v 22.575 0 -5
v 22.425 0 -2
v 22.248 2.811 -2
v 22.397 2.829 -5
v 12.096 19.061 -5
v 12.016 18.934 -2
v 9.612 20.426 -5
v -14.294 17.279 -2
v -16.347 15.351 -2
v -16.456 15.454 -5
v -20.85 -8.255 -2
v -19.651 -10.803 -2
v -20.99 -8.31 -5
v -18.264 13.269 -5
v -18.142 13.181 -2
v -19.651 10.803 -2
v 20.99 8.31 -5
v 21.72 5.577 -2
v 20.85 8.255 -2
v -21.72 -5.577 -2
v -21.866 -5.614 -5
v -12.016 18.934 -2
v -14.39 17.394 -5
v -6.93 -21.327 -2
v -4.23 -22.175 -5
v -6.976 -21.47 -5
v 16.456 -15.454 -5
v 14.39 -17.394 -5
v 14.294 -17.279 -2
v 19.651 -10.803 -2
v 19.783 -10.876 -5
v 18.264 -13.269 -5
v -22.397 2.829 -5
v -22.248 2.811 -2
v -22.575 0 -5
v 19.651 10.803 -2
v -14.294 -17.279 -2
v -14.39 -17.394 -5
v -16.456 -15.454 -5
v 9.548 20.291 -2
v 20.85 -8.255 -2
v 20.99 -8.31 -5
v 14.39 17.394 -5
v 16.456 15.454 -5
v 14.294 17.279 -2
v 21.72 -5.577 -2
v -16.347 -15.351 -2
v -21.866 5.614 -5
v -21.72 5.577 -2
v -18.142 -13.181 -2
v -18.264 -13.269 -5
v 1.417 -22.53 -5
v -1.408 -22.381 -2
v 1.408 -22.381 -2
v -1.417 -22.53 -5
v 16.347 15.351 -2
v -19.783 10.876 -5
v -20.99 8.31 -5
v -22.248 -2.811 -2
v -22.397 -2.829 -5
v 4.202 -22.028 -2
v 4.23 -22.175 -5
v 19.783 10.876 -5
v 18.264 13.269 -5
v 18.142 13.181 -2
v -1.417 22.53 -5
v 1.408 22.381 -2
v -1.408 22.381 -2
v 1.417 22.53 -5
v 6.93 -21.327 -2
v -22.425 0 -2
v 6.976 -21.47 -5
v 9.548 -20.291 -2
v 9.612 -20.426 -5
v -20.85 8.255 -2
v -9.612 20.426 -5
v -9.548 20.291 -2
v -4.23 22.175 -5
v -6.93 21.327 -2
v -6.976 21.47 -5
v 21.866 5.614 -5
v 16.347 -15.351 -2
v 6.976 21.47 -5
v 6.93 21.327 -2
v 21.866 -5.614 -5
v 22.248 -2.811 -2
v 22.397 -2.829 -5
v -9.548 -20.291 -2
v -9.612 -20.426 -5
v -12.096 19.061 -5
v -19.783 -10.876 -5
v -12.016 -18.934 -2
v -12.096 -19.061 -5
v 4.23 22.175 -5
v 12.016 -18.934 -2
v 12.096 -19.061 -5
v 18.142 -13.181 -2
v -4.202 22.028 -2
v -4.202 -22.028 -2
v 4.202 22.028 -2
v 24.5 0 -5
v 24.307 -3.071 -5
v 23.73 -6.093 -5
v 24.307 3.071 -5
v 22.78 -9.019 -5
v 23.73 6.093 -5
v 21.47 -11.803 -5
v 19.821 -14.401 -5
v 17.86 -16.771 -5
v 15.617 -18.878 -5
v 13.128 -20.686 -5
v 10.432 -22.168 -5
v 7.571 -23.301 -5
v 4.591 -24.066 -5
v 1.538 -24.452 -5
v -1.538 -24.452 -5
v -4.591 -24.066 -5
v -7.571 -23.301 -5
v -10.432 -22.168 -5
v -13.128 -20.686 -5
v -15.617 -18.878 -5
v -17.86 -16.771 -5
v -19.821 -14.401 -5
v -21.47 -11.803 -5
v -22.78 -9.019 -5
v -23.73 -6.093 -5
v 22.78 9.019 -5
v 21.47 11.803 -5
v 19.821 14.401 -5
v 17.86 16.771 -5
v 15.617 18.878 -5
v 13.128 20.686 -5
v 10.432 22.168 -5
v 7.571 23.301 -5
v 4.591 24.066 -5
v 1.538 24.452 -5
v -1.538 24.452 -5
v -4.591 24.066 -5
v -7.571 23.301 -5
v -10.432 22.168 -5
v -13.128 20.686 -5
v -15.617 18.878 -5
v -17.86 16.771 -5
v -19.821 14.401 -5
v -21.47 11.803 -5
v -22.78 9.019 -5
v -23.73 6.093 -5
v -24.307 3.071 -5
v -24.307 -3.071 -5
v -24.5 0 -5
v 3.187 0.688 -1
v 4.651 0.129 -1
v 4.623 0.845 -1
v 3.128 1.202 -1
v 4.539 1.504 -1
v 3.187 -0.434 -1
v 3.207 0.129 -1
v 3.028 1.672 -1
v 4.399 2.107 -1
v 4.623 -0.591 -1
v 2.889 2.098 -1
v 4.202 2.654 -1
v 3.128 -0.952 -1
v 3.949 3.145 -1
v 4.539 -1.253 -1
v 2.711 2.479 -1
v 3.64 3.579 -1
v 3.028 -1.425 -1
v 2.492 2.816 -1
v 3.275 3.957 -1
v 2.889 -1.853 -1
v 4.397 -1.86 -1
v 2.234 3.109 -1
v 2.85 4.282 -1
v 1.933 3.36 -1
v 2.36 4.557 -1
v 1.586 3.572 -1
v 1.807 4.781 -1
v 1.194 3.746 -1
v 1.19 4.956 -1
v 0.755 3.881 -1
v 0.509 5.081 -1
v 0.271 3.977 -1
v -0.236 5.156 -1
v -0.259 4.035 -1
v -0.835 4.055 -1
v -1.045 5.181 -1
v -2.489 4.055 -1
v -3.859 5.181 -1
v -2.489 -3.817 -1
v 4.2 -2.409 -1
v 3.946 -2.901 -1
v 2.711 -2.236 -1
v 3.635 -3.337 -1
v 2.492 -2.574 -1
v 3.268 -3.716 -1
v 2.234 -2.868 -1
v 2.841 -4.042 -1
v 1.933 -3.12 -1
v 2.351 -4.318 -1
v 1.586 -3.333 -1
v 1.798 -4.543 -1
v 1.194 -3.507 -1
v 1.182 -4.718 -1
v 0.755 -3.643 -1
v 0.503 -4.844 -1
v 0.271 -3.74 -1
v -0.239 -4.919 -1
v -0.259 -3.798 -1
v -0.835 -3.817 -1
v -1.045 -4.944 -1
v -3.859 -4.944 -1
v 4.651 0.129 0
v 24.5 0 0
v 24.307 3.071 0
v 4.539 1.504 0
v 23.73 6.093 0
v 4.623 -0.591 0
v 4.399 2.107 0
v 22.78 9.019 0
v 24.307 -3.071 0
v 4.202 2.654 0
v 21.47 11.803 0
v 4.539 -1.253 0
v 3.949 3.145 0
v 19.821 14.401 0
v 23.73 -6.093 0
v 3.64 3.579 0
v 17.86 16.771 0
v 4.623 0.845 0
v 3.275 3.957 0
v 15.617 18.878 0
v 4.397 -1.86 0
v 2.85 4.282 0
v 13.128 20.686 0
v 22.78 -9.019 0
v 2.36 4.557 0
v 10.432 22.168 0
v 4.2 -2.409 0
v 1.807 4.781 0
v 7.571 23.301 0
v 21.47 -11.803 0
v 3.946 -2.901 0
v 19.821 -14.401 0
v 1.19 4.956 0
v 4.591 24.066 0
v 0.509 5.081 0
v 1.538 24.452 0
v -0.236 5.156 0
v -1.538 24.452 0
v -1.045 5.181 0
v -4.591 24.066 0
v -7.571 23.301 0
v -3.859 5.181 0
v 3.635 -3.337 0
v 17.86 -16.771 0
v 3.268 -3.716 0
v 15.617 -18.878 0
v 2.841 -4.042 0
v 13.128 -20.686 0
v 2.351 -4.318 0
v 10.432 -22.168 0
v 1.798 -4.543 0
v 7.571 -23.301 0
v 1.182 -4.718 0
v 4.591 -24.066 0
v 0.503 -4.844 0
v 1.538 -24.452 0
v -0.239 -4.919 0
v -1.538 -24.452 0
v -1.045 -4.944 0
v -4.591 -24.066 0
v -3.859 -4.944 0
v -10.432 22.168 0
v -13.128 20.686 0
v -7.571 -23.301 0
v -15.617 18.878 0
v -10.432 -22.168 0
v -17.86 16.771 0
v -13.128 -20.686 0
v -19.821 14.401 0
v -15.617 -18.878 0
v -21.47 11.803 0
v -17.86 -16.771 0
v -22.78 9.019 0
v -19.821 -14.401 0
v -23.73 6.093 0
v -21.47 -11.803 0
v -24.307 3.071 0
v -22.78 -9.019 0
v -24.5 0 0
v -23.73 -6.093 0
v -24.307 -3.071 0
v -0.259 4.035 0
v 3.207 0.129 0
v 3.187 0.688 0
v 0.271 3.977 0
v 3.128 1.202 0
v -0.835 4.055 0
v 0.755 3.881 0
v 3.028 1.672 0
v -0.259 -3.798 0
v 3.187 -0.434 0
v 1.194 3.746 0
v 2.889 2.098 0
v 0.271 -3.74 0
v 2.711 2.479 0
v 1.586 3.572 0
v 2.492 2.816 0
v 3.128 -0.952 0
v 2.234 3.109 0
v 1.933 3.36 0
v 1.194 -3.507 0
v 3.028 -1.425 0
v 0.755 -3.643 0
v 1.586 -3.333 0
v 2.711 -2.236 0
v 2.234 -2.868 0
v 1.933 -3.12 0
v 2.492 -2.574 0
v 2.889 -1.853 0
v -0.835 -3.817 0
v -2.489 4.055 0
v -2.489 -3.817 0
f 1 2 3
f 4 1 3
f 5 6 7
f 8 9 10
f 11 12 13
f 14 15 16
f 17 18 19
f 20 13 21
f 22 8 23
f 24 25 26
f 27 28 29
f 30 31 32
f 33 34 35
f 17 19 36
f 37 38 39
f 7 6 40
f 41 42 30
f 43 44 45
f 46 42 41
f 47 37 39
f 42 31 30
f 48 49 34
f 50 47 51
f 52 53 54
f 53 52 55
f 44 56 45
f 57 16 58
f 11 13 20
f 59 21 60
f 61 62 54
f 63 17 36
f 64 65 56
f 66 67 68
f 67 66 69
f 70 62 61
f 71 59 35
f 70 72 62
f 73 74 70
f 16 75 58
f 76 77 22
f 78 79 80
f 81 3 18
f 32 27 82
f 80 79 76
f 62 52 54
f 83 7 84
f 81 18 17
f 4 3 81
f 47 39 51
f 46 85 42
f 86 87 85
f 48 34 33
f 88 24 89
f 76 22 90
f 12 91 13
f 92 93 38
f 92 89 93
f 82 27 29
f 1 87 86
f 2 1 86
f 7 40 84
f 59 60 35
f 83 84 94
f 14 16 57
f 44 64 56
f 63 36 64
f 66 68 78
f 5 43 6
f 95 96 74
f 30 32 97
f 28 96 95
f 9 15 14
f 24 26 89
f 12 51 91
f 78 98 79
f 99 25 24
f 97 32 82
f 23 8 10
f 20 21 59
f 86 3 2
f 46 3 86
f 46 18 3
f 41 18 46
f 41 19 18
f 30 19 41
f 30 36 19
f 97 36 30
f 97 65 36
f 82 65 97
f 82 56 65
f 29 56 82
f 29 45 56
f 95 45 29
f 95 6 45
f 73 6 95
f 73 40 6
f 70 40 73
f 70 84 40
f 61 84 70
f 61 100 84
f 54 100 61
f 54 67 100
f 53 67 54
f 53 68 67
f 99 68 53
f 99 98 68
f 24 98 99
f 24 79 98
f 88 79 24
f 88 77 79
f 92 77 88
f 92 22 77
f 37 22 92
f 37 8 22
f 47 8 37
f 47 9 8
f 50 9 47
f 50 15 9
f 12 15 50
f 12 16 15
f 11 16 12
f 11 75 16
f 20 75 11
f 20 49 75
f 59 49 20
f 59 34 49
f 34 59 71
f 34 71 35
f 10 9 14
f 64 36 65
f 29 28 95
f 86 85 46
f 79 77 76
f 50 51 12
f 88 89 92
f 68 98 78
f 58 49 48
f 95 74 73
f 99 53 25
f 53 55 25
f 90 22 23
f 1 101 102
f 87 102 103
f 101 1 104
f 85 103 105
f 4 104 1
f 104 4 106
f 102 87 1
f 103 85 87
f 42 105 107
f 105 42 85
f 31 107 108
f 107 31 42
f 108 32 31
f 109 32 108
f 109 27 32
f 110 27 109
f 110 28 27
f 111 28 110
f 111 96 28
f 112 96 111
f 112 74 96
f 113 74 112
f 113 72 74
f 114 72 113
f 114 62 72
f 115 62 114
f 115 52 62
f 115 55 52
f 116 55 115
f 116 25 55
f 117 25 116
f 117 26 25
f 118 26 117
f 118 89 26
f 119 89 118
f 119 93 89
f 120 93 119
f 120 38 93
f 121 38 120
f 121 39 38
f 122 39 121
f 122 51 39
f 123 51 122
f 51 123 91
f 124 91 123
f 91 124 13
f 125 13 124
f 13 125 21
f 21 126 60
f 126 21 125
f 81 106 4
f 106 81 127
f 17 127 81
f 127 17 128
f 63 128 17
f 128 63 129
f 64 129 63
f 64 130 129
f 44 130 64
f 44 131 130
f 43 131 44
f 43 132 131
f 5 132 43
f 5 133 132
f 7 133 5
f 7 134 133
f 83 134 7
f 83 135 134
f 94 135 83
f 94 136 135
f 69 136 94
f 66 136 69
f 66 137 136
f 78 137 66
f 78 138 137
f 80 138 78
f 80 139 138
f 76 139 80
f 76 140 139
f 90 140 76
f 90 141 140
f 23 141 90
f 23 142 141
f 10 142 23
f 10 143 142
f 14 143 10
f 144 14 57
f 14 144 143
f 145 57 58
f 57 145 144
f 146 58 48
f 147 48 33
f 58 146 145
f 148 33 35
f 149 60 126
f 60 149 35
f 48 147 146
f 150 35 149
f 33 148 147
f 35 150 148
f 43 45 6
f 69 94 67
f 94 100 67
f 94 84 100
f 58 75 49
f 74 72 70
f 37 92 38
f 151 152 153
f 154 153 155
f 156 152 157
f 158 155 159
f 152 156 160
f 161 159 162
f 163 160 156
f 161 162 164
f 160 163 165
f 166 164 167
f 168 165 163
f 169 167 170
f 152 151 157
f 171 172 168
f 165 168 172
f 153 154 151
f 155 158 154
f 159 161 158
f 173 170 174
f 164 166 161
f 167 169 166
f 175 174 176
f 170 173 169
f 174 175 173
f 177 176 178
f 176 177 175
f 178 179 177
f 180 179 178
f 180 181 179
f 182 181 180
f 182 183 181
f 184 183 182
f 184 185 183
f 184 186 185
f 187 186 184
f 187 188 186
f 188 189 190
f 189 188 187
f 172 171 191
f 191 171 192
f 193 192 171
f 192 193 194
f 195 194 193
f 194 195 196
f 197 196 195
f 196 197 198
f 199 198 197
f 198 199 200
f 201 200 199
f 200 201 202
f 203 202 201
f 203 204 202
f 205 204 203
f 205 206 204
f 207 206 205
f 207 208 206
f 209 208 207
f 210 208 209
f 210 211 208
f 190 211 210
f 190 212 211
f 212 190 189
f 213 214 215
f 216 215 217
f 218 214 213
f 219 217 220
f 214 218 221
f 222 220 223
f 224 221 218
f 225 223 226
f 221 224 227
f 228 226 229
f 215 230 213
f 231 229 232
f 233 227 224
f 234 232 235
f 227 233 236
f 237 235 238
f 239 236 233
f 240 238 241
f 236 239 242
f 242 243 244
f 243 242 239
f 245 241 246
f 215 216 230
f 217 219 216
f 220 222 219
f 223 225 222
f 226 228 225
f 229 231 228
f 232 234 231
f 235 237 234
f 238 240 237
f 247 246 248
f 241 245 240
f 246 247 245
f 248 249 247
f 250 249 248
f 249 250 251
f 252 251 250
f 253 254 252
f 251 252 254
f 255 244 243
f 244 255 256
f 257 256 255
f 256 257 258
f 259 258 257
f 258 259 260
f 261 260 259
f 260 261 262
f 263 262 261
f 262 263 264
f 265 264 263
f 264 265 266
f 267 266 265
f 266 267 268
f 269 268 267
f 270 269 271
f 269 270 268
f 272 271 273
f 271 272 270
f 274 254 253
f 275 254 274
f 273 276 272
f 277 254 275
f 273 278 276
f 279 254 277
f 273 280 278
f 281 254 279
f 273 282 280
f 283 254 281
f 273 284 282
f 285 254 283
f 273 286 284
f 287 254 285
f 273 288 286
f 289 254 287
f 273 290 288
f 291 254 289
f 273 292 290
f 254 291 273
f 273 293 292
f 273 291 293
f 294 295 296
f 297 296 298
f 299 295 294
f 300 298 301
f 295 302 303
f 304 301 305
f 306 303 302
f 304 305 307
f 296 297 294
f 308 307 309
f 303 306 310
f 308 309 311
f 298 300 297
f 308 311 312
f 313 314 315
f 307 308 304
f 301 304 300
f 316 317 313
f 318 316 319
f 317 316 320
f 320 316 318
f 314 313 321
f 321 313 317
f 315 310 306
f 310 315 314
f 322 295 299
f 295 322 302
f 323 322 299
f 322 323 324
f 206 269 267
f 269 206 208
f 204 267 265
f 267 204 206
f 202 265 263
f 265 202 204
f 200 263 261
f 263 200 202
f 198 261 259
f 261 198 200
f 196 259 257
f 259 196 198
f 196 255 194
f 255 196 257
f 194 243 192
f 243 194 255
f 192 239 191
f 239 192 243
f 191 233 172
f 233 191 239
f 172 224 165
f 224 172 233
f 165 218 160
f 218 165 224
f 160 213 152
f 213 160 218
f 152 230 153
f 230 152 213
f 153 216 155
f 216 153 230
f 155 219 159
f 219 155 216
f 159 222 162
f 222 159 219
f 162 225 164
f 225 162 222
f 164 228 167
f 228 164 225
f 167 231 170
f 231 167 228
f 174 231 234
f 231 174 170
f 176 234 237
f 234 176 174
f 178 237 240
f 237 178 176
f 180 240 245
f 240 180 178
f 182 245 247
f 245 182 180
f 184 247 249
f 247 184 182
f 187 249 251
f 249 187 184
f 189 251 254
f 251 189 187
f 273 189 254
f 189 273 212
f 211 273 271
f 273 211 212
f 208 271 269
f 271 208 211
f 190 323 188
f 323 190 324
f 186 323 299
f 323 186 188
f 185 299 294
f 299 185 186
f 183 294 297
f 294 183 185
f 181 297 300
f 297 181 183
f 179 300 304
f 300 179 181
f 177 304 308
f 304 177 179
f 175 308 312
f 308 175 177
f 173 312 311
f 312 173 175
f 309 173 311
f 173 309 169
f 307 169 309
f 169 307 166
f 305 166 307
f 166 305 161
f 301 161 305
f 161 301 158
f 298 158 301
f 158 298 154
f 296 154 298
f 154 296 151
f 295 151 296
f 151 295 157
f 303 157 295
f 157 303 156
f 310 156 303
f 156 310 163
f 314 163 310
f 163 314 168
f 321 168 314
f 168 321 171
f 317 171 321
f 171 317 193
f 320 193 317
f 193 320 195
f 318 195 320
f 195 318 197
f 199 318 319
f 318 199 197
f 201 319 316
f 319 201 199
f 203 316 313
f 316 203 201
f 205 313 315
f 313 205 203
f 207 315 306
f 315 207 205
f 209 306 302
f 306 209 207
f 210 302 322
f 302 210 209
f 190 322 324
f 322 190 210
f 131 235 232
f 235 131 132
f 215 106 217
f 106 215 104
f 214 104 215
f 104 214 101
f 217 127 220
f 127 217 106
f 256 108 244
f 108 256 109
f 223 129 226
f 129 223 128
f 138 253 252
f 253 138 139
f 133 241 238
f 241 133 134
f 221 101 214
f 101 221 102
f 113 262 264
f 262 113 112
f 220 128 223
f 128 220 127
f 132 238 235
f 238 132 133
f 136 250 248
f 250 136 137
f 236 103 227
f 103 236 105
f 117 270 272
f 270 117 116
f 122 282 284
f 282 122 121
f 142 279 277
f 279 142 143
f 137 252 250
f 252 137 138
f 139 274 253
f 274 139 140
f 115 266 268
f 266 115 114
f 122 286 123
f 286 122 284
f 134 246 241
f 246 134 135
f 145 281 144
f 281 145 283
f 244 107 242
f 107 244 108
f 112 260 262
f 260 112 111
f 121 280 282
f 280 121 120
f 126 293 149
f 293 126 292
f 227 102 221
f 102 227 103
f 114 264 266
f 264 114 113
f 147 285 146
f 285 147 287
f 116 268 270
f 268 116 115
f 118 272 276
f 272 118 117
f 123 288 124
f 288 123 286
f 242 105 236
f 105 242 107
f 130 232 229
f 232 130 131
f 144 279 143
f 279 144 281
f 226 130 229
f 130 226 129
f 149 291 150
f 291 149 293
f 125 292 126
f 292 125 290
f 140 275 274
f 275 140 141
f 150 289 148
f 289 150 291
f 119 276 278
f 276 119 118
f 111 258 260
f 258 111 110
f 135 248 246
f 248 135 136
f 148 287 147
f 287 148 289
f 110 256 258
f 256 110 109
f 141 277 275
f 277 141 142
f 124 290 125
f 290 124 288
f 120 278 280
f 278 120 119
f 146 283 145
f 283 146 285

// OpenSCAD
$fn = 50;


difference() {
	union() {
		translate(v = [0, 0, -5.0000000000]) {
			cylinder(h = 5, r = 24.5000000000);
		}
	}
	union() {
		#translate(v = [0, 0, -5.0000000000]) {
			cylinder(h = 3, r1 = 22.5750000000, r2 = 22.4250000000);
		}
		translate(v = [0, 0, -1]) {
			linear_extrude(height = 1) {
				text(font = "Impact", halign = "center", size = 10, text = "D", valign = "center");
			}
		}
	}
}
